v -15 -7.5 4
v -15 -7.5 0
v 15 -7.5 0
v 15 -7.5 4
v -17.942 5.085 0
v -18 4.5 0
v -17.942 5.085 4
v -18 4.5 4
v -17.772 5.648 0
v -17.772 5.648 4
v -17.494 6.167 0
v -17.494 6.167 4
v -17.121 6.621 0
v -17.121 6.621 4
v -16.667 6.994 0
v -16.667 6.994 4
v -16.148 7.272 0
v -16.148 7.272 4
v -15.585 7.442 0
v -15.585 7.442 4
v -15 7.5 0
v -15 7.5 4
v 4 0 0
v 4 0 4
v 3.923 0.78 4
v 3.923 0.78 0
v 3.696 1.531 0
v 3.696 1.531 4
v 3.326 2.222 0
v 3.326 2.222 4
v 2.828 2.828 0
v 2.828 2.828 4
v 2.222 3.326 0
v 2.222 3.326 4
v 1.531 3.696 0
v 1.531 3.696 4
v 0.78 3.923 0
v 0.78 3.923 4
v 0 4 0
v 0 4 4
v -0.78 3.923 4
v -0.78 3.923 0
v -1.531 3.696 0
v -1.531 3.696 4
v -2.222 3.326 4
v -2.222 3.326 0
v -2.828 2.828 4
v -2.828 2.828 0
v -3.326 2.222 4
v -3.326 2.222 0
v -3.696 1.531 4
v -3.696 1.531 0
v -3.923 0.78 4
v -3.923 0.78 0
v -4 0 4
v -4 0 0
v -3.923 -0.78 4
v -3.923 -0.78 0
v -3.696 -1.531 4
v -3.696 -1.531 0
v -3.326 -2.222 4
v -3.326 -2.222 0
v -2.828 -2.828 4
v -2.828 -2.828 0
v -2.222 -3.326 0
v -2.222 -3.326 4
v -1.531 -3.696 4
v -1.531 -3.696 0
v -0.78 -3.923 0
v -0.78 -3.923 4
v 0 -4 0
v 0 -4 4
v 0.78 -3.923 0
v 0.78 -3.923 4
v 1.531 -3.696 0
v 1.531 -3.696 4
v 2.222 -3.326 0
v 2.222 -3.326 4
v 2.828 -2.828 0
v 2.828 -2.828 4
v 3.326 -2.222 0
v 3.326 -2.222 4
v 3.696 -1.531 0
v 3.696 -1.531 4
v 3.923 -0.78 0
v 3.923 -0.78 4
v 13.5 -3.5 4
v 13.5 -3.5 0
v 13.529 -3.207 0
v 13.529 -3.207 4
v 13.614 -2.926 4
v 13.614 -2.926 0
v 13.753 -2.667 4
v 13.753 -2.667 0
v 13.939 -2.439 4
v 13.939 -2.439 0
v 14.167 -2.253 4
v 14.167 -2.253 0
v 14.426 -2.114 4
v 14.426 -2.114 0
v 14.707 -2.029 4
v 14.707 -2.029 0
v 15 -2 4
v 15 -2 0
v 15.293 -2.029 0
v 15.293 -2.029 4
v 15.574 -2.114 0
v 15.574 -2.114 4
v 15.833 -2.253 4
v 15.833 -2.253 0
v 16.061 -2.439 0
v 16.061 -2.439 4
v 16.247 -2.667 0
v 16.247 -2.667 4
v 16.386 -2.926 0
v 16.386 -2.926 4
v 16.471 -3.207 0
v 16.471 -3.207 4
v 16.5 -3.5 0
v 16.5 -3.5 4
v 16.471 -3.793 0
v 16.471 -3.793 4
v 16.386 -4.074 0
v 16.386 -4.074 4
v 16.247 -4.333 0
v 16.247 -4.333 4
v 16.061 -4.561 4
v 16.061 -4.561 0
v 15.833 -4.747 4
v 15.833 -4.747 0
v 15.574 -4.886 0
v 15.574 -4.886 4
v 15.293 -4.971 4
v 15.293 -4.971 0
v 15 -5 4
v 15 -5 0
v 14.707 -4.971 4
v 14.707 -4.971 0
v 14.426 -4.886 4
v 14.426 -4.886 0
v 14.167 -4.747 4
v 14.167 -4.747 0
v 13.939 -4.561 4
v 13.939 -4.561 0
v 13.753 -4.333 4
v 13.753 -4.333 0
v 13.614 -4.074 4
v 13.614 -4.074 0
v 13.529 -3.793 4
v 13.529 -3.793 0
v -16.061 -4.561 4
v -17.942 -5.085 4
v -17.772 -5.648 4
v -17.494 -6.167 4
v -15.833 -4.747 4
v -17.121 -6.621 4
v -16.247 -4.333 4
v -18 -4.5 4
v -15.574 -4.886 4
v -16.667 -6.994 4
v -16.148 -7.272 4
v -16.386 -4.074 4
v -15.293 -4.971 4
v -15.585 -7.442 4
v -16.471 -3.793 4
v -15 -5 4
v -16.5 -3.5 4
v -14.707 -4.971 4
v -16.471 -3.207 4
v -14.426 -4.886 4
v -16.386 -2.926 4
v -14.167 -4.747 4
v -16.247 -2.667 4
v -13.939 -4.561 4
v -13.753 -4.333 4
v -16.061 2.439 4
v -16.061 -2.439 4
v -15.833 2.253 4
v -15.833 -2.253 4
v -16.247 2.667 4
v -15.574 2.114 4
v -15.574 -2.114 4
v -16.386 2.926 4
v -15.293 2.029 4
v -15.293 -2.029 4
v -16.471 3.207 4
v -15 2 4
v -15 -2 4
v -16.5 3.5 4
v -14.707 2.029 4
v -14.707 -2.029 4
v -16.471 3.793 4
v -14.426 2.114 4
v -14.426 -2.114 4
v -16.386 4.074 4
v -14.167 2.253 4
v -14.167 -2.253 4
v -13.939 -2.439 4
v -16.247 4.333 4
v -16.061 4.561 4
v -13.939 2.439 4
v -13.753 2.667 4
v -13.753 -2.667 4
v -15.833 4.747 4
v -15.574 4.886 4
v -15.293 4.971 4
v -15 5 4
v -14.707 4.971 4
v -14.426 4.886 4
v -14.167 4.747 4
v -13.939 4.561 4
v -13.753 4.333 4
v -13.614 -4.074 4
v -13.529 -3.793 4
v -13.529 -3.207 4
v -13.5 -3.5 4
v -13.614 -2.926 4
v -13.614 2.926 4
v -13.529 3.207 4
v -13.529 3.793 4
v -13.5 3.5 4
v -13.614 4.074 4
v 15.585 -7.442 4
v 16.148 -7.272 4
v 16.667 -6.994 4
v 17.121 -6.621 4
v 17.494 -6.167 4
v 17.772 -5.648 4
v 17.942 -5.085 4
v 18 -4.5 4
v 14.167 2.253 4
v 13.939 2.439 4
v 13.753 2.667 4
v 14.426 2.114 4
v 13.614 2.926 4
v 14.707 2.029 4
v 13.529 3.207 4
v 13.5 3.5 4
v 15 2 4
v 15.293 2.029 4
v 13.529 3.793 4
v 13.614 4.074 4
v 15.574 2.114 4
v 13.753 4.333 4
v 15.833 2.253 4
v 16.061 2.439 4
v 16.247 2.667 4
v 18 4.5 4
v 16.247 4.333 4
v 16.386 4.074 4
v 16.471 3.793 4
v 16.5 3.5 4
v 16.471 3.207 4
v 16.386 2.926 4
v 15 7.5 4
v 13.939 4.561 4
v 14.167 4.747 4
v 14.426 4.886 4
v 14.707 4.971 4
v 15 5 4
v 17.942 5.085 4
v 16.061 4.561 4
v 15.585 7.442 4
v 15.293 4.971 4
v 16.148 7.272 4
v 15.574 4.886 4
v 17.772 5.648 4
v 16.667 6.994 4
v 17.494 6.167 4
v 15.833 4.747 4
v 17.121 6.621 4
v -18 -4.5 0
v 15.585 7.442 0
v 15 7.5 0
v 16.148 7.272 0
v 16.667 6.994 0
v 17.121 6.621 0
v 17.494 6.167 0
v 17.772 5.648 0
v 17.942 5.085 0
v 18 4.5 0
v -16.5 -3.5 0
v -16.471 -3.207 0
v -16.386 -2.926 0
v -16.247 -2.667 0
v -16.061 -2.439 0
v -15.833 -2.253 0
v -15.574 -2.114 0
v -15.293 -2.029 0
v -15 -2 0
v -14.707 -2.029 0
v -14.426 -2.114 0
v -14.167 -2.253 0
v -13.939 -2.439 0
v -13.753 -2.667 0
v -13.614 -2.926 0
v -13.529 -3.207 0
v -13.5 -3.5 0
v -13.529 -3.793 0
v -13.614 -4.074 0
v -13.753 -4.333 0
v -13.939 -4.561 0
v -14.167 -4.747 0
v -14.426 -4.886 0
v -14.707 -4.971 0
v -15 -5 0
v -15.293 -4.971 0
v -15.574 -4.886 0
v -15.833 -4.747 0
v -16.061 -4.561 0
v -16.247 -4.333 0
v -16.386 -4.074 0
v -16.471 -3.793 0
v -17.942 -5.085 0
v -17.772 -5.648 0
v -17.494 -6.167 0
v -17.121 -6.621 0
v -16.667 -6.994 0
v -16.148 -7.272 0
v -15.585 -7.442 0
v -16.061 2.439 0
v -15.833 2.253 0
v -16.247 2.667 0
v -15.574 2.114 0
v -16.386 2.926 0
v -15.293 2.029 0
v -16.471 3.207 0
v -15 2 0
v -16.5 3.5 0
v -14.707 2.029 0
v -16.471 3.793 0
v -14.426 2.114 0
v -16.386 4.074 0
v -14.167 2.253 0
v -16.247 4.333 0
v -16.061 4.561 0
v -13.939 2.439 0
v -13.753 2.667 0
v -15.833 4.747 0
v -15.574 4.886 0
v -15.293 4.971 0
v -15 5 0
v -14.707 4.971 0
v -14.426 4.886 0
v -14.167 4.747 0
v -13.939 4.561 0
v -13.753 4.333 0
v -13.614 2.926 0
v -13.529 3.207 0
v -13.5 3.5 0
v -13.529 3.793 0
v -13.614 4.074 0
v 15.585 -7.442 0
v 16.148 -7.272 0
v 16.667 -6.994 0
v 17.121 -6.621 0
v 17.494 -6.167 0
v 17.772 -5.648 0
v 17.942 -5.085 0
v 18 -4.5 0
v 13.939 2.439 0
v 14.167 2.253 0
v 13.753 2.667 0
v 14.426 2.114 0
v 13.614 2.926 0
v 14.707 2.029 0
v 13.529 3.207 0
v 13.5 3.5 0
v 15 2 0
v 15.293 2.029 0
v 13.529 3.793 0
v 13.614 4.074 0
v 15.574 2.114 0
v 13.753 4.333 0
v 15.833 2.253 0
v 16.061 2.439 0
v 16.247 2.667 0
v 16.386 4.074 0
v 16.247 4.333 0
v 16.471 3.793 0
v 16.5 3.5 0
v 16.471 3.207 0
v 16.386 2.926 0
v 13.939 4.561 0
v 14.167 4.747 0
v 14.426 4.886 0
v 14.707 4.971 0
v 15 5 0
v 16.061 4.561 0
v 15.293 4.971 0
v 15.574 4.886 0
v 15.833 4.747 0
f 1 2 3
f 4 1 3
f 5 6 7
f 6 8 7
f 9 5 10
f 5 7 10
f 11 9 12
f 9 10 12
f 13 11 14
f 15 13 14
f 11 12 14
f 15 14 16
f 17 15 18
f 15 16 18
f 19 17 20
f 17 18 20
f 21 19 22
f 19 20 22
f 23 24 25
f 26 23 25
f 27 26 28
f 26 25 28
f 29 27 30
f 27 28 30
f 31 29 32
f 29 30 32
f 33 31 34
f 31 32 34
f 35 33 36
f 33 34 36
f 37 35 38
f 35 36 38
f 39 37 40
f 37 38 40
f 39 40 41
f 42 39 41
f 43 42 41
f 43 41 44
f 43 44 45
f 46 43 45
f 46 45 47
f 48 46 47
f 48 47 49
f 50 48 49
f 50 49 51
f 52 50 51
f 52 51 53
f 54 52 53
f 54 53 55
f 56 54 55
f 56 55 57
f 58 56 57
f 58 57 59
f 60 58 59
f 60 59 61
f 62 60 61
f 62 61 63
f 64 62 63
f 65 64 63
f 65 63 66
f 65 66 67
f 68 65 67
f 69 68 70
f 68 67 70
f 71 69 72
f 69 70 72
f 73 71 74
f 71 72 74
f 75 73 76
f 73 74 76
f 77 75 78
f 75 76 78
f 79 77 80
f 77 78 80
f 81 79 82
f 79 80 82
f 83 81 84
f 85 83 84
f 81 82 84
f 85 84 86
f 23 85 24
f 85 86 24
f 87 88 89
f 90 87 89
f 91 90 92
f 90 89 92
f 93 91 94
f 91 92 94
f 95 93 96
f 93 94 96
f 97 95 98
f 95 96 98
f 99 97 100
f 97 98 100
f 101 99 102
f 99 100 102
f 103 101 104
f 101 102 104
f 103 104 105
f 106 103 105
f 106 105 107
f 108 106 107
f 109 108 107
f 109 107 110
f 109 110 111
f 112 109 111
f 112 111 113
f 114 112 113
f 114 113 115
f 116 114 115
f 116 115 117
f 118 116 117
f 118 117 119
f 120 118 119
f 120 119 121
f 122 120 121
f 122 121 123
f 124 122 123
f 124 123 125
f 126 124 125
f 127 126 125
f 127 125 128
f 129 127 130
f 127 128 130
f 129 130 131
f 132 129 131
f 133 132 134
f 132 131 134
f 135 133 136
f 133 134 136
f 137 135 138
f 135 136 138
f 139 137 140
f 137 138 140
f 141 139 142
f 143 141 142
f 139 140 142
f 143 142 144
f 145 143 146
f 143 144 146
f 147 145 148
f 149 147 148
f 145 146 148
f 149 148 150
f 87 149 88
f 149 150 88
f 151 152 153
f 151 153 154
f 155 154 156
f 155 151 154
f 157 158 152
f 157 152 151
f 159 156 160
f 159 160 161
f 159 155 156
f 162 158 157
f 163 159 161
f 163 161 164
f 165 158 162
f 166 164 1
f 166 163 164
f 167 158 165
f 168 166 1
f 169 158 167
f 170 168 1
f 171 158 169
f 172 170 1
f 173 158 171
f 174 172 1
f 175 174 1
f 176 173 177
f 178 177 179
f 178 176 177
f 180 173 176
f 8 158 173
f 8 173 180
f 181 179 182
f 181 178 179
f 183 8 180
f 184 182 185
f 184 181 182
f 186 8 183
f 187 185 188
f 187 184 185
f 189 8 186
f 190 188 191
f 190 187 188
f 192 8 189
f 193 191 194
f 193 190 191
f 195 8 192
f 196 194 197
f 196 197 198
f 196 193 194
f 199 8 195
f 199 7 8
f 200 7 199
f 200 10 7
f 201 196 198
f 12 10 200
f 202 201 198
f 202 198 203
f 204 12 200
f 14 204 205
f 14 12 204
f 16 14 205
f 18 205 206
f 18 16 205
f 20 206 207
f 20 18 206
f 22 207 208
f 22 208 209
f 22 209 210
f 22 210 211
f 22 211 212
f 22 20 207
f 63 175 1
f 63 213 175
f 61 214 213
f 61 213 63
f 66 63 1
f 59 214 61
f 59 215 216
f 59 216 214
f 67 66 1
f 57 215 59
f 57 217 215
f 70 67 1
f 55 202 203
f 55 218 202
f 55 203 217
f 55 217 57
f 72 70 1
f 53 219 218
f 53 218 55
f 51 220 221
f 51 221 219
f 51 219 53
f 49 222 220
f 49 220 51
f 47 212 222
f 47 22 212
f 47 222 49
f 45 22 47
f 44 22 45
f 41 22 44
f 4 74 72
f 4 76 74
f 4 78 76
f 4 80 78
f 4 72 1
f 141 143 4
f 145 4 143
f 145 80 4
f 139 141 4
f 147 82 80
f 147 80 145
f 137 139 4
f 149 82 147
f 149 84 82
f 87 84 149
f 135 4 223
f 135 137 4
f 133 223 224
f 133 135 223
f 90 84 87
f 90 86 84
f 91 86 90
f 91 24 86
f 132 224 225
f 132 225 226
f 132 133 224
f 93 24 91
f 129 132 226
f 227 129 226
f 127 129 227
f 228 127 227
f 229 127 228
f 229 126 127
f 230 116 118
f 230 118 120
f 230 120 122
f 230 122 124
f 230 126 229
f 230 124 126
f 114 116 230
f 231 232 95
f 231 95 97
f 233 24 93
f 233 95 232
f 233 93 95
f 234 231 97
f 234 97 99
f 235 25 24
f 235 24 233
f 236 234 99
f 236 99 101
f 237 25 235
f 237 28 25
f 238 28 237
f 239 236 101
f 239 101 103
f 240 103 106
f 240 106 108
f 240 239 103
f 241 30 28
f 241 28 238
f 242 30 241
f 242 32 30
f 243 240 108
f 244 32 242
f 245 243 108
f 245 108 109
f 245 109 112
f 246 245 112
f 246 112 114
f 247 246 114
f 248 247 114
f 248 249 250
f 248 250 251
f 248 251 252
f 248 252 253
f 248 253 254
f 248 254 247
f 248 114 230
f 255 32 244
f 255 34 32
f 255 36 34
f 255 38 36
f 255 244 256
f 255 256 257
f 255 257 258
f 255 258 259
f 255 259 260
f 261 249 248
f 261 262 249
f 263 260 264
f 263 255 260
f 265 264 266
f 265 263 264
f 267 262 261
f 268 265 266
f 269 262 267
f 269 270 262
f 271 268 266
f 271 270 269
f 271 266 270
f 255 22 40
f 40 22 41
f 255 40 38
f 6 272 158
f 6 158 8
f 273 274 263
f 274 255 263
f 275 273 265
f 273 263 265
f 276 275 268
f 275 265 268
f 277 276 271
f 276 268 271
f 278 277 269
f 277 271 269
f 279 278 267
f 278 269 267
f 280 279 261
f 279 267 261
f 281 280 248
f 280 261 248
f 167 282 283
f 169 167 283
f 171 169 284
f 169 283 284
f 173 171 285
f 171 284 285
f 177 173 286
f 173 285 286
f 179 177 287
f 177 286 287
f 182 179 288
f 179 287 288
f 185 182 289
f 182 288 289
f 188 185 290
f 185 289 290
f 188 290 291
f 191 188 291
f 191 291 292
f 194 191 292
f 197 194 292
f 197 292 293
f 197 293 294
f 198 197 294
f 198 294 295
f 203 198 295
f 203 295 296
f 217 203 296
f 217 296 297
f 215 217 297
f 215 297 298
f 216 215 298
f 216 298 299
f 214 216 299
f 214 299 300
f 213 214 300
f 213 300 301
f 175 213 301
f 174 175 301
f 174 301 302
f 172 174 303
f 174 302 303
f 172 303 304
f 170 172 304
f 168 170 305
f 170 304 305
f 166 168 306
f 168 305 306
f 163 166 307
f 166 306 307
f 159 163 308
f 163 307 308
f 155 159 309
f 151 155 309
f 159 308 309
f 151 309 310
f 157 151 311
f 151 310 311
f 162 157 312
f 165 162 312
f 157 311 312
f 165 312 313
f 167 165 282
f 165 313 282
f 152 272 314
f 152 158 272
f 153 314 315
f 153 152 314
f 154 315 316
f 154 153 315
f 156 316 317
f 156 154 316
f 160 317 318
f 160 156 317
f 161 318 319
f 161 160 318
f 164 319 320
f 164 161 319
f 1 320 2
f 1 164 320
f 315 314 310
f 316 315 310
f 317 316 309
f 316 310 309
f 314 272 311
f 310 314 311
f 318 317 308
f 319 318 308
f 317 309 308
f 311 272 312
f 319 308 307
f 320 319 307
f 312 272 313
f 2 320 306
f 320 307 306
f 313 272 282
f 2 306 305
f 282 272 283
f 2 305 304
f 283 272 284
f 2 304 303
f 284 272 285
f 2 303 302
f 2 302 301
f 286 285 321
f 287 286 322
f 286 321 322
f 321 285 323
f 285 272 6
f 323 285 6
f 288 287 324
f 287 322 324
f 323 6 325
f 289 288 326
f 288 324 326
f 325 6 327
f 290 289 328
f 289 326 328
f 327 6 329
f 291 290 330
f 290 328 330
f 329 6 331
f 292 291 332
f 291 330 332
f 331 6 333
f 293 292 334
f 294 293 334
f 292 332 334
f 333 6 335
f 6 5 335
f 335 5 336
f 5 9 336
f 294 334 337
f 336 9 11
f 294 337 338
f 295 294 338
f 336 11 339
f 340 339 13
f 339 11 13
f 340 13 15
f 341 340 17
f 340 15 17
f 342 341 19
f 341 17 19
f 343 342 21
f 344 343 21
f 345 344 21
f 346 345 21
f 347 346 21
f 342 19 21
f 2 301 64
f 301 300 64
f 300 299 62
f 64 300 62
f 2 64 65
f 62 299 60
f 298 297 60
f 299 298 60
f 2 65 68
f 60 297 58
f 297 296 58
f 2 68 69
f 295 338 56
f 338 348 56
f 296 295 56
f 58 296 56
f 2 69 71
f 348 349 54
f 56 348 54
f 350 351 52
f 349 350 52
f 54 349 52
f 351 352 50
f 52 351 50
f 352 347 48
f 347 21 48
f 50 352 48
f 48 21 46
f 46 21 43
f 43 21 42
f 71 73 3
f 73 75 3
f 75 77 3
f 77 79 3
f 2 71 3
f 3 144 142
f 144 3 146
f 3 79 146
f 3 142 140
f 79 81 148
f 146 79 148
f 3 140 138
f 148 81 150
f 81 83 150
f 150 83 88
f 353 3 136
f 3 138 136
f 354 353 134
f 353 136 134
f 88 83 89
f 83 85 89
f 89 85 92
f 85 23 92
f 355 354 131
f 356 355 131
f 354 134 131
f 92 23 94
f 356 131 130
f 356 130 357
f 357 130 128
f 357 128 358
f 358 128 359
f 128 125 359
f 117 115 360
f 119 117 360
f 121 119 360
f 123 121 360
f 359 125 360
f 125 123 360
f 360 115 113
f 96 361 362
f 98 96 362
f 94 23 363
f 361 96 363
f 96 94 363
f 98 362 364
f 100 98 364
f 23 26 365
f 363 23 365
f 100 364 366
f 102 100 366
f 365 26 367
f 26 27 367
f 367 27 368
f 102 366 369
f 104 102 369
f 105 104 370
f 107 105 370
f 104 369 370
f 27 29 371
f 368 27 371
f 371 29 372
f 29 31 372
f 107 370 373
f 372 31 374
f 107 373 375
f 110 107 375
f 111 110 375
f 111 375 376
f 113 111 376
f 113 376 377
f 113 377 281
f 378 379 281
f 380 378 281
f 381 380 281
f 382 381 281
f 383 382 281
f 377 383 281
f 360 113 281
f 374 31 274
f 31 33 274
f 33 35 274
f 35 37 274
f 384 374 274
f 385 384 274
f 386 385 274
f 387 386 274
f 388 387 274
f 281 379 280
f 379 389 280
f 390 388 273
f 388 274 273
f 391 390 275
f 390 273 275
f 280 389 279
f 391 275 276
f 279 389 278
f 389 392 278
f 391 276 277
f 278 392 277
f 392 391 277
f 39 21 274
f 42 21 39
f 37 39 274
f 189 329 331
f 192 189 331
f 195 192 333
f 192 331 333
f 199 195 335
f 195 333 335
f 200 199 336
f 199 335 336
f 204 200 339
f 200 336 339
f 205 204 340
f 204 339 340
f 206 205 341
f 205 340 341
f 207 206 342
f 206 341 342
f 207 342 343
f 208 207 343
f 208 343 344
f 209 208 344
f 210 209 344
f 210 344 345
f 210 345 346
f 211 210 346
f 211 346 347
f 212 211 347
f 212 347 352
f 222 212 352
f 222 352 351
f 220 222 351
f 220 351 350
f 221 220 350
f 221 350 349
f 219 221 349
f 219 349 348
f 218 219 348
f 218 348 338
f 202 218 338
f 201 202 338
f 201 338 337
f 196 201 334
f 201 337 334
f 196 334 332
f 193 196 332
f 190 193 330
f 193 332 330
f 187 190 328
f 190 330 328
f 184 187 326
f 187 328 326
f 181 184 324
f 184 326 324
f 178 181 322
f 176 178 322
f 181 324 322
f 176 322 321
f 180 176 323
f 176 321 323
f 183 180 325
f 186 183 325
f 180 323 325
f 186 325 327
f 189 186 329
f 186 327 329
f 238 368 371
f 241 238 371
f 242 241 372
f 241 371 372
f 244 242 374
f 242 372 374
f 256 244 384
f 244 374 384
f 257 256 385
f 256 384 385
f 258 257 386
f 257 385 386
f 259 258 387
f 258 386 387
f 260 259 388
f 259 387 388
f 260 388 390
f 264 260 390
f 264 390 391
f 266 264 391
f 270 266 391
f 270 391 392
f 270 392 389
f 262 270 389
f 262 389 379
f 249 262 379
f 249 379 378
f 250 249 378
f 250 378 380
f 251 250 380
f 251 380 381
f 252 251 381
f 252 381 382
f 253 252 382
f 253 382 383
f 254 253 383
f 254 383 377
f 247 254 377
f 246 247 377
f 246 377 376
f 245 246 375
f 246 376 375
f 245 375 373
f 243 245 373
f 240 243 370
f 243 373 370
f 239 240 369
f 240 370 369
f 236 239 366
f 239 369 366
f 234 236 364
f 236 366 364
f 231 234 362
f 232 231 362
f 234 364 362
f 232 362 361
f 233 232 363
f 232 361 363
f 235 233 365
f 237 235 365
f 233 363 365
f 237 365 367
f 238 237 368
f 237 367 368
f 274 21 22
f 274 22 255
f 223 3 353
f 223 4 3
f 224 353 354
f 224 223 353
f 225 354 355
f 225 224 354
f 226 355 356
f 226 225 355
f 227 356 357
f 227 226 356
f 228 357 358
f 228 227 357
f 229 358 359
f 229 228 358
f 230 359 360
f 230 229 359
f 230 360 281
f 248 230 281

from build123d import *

# Parameters (mm, degrees)
SKETCH_1_W          = 36
SKETCH_1_H          = 15
EXTRUDE_1_DEPTH     = 4
SKETCH_2_R          = 4
CUT_EXTRUDE_1_DEPTH = 20.906029237
SKETCH_4_R          = 1.5
CUT_EXTRUDE_2_DEPTH = 20.906029237
FILLET_1_R          = 3


with BuildPart() as part:
    # 草图1 → 凸台-拉伸1 (new body)
    with BuildSketch(Plane.XY):
        Rectangle(SKETCH_1_W, SKETCH_1_H)
    extrude(amount=EXTRUDE_1_DEPTH)

    # 草图2 → 切除-拉伸1 (cut, through all)
    with BuildSketch(Plane.XY.offset(4)):
        Circle(SKETCH_2_R)
    extrude(amount=-CUT_EXTRUDE_1_DEPTH, mode=Mode.SUBTRACT)

    # 草图4 → 切除-拉伸2 (cut, through all)
    with BuildSketch(Plane(origin=(0, 0, 0), x_dir=(-1, 0, 0), z_dir=(0, 0, -1))):
        with Locations((15, -3.5)):
            Circle(SKETCH_4_R)
        with Locations((15, 3.5)):
            Circle(SKETCH_4_R)
        with Locations((-15, 3.5)):
            Circle(SKETCH_4_R)
        with Locations((-15, -3.5)):
            Circle(SKETCH_4_R)
    extrude(amount=-CUT_EXTRUDE_2_DEPTH, mode=Mode.SUBTRACT)

    # 圆角1
    fillet_1_edges = [part.edges().sort_by_distance(p)[0] for p in [
        (-18, 7.5, 2),
        (18, 7.5, 2),
        (18, -7.5, 2),
        (-18, -7.5, 2),
    ]]
    fillet(fillet_1_edges, radius=FILLET_1_R)


solid = part.part
